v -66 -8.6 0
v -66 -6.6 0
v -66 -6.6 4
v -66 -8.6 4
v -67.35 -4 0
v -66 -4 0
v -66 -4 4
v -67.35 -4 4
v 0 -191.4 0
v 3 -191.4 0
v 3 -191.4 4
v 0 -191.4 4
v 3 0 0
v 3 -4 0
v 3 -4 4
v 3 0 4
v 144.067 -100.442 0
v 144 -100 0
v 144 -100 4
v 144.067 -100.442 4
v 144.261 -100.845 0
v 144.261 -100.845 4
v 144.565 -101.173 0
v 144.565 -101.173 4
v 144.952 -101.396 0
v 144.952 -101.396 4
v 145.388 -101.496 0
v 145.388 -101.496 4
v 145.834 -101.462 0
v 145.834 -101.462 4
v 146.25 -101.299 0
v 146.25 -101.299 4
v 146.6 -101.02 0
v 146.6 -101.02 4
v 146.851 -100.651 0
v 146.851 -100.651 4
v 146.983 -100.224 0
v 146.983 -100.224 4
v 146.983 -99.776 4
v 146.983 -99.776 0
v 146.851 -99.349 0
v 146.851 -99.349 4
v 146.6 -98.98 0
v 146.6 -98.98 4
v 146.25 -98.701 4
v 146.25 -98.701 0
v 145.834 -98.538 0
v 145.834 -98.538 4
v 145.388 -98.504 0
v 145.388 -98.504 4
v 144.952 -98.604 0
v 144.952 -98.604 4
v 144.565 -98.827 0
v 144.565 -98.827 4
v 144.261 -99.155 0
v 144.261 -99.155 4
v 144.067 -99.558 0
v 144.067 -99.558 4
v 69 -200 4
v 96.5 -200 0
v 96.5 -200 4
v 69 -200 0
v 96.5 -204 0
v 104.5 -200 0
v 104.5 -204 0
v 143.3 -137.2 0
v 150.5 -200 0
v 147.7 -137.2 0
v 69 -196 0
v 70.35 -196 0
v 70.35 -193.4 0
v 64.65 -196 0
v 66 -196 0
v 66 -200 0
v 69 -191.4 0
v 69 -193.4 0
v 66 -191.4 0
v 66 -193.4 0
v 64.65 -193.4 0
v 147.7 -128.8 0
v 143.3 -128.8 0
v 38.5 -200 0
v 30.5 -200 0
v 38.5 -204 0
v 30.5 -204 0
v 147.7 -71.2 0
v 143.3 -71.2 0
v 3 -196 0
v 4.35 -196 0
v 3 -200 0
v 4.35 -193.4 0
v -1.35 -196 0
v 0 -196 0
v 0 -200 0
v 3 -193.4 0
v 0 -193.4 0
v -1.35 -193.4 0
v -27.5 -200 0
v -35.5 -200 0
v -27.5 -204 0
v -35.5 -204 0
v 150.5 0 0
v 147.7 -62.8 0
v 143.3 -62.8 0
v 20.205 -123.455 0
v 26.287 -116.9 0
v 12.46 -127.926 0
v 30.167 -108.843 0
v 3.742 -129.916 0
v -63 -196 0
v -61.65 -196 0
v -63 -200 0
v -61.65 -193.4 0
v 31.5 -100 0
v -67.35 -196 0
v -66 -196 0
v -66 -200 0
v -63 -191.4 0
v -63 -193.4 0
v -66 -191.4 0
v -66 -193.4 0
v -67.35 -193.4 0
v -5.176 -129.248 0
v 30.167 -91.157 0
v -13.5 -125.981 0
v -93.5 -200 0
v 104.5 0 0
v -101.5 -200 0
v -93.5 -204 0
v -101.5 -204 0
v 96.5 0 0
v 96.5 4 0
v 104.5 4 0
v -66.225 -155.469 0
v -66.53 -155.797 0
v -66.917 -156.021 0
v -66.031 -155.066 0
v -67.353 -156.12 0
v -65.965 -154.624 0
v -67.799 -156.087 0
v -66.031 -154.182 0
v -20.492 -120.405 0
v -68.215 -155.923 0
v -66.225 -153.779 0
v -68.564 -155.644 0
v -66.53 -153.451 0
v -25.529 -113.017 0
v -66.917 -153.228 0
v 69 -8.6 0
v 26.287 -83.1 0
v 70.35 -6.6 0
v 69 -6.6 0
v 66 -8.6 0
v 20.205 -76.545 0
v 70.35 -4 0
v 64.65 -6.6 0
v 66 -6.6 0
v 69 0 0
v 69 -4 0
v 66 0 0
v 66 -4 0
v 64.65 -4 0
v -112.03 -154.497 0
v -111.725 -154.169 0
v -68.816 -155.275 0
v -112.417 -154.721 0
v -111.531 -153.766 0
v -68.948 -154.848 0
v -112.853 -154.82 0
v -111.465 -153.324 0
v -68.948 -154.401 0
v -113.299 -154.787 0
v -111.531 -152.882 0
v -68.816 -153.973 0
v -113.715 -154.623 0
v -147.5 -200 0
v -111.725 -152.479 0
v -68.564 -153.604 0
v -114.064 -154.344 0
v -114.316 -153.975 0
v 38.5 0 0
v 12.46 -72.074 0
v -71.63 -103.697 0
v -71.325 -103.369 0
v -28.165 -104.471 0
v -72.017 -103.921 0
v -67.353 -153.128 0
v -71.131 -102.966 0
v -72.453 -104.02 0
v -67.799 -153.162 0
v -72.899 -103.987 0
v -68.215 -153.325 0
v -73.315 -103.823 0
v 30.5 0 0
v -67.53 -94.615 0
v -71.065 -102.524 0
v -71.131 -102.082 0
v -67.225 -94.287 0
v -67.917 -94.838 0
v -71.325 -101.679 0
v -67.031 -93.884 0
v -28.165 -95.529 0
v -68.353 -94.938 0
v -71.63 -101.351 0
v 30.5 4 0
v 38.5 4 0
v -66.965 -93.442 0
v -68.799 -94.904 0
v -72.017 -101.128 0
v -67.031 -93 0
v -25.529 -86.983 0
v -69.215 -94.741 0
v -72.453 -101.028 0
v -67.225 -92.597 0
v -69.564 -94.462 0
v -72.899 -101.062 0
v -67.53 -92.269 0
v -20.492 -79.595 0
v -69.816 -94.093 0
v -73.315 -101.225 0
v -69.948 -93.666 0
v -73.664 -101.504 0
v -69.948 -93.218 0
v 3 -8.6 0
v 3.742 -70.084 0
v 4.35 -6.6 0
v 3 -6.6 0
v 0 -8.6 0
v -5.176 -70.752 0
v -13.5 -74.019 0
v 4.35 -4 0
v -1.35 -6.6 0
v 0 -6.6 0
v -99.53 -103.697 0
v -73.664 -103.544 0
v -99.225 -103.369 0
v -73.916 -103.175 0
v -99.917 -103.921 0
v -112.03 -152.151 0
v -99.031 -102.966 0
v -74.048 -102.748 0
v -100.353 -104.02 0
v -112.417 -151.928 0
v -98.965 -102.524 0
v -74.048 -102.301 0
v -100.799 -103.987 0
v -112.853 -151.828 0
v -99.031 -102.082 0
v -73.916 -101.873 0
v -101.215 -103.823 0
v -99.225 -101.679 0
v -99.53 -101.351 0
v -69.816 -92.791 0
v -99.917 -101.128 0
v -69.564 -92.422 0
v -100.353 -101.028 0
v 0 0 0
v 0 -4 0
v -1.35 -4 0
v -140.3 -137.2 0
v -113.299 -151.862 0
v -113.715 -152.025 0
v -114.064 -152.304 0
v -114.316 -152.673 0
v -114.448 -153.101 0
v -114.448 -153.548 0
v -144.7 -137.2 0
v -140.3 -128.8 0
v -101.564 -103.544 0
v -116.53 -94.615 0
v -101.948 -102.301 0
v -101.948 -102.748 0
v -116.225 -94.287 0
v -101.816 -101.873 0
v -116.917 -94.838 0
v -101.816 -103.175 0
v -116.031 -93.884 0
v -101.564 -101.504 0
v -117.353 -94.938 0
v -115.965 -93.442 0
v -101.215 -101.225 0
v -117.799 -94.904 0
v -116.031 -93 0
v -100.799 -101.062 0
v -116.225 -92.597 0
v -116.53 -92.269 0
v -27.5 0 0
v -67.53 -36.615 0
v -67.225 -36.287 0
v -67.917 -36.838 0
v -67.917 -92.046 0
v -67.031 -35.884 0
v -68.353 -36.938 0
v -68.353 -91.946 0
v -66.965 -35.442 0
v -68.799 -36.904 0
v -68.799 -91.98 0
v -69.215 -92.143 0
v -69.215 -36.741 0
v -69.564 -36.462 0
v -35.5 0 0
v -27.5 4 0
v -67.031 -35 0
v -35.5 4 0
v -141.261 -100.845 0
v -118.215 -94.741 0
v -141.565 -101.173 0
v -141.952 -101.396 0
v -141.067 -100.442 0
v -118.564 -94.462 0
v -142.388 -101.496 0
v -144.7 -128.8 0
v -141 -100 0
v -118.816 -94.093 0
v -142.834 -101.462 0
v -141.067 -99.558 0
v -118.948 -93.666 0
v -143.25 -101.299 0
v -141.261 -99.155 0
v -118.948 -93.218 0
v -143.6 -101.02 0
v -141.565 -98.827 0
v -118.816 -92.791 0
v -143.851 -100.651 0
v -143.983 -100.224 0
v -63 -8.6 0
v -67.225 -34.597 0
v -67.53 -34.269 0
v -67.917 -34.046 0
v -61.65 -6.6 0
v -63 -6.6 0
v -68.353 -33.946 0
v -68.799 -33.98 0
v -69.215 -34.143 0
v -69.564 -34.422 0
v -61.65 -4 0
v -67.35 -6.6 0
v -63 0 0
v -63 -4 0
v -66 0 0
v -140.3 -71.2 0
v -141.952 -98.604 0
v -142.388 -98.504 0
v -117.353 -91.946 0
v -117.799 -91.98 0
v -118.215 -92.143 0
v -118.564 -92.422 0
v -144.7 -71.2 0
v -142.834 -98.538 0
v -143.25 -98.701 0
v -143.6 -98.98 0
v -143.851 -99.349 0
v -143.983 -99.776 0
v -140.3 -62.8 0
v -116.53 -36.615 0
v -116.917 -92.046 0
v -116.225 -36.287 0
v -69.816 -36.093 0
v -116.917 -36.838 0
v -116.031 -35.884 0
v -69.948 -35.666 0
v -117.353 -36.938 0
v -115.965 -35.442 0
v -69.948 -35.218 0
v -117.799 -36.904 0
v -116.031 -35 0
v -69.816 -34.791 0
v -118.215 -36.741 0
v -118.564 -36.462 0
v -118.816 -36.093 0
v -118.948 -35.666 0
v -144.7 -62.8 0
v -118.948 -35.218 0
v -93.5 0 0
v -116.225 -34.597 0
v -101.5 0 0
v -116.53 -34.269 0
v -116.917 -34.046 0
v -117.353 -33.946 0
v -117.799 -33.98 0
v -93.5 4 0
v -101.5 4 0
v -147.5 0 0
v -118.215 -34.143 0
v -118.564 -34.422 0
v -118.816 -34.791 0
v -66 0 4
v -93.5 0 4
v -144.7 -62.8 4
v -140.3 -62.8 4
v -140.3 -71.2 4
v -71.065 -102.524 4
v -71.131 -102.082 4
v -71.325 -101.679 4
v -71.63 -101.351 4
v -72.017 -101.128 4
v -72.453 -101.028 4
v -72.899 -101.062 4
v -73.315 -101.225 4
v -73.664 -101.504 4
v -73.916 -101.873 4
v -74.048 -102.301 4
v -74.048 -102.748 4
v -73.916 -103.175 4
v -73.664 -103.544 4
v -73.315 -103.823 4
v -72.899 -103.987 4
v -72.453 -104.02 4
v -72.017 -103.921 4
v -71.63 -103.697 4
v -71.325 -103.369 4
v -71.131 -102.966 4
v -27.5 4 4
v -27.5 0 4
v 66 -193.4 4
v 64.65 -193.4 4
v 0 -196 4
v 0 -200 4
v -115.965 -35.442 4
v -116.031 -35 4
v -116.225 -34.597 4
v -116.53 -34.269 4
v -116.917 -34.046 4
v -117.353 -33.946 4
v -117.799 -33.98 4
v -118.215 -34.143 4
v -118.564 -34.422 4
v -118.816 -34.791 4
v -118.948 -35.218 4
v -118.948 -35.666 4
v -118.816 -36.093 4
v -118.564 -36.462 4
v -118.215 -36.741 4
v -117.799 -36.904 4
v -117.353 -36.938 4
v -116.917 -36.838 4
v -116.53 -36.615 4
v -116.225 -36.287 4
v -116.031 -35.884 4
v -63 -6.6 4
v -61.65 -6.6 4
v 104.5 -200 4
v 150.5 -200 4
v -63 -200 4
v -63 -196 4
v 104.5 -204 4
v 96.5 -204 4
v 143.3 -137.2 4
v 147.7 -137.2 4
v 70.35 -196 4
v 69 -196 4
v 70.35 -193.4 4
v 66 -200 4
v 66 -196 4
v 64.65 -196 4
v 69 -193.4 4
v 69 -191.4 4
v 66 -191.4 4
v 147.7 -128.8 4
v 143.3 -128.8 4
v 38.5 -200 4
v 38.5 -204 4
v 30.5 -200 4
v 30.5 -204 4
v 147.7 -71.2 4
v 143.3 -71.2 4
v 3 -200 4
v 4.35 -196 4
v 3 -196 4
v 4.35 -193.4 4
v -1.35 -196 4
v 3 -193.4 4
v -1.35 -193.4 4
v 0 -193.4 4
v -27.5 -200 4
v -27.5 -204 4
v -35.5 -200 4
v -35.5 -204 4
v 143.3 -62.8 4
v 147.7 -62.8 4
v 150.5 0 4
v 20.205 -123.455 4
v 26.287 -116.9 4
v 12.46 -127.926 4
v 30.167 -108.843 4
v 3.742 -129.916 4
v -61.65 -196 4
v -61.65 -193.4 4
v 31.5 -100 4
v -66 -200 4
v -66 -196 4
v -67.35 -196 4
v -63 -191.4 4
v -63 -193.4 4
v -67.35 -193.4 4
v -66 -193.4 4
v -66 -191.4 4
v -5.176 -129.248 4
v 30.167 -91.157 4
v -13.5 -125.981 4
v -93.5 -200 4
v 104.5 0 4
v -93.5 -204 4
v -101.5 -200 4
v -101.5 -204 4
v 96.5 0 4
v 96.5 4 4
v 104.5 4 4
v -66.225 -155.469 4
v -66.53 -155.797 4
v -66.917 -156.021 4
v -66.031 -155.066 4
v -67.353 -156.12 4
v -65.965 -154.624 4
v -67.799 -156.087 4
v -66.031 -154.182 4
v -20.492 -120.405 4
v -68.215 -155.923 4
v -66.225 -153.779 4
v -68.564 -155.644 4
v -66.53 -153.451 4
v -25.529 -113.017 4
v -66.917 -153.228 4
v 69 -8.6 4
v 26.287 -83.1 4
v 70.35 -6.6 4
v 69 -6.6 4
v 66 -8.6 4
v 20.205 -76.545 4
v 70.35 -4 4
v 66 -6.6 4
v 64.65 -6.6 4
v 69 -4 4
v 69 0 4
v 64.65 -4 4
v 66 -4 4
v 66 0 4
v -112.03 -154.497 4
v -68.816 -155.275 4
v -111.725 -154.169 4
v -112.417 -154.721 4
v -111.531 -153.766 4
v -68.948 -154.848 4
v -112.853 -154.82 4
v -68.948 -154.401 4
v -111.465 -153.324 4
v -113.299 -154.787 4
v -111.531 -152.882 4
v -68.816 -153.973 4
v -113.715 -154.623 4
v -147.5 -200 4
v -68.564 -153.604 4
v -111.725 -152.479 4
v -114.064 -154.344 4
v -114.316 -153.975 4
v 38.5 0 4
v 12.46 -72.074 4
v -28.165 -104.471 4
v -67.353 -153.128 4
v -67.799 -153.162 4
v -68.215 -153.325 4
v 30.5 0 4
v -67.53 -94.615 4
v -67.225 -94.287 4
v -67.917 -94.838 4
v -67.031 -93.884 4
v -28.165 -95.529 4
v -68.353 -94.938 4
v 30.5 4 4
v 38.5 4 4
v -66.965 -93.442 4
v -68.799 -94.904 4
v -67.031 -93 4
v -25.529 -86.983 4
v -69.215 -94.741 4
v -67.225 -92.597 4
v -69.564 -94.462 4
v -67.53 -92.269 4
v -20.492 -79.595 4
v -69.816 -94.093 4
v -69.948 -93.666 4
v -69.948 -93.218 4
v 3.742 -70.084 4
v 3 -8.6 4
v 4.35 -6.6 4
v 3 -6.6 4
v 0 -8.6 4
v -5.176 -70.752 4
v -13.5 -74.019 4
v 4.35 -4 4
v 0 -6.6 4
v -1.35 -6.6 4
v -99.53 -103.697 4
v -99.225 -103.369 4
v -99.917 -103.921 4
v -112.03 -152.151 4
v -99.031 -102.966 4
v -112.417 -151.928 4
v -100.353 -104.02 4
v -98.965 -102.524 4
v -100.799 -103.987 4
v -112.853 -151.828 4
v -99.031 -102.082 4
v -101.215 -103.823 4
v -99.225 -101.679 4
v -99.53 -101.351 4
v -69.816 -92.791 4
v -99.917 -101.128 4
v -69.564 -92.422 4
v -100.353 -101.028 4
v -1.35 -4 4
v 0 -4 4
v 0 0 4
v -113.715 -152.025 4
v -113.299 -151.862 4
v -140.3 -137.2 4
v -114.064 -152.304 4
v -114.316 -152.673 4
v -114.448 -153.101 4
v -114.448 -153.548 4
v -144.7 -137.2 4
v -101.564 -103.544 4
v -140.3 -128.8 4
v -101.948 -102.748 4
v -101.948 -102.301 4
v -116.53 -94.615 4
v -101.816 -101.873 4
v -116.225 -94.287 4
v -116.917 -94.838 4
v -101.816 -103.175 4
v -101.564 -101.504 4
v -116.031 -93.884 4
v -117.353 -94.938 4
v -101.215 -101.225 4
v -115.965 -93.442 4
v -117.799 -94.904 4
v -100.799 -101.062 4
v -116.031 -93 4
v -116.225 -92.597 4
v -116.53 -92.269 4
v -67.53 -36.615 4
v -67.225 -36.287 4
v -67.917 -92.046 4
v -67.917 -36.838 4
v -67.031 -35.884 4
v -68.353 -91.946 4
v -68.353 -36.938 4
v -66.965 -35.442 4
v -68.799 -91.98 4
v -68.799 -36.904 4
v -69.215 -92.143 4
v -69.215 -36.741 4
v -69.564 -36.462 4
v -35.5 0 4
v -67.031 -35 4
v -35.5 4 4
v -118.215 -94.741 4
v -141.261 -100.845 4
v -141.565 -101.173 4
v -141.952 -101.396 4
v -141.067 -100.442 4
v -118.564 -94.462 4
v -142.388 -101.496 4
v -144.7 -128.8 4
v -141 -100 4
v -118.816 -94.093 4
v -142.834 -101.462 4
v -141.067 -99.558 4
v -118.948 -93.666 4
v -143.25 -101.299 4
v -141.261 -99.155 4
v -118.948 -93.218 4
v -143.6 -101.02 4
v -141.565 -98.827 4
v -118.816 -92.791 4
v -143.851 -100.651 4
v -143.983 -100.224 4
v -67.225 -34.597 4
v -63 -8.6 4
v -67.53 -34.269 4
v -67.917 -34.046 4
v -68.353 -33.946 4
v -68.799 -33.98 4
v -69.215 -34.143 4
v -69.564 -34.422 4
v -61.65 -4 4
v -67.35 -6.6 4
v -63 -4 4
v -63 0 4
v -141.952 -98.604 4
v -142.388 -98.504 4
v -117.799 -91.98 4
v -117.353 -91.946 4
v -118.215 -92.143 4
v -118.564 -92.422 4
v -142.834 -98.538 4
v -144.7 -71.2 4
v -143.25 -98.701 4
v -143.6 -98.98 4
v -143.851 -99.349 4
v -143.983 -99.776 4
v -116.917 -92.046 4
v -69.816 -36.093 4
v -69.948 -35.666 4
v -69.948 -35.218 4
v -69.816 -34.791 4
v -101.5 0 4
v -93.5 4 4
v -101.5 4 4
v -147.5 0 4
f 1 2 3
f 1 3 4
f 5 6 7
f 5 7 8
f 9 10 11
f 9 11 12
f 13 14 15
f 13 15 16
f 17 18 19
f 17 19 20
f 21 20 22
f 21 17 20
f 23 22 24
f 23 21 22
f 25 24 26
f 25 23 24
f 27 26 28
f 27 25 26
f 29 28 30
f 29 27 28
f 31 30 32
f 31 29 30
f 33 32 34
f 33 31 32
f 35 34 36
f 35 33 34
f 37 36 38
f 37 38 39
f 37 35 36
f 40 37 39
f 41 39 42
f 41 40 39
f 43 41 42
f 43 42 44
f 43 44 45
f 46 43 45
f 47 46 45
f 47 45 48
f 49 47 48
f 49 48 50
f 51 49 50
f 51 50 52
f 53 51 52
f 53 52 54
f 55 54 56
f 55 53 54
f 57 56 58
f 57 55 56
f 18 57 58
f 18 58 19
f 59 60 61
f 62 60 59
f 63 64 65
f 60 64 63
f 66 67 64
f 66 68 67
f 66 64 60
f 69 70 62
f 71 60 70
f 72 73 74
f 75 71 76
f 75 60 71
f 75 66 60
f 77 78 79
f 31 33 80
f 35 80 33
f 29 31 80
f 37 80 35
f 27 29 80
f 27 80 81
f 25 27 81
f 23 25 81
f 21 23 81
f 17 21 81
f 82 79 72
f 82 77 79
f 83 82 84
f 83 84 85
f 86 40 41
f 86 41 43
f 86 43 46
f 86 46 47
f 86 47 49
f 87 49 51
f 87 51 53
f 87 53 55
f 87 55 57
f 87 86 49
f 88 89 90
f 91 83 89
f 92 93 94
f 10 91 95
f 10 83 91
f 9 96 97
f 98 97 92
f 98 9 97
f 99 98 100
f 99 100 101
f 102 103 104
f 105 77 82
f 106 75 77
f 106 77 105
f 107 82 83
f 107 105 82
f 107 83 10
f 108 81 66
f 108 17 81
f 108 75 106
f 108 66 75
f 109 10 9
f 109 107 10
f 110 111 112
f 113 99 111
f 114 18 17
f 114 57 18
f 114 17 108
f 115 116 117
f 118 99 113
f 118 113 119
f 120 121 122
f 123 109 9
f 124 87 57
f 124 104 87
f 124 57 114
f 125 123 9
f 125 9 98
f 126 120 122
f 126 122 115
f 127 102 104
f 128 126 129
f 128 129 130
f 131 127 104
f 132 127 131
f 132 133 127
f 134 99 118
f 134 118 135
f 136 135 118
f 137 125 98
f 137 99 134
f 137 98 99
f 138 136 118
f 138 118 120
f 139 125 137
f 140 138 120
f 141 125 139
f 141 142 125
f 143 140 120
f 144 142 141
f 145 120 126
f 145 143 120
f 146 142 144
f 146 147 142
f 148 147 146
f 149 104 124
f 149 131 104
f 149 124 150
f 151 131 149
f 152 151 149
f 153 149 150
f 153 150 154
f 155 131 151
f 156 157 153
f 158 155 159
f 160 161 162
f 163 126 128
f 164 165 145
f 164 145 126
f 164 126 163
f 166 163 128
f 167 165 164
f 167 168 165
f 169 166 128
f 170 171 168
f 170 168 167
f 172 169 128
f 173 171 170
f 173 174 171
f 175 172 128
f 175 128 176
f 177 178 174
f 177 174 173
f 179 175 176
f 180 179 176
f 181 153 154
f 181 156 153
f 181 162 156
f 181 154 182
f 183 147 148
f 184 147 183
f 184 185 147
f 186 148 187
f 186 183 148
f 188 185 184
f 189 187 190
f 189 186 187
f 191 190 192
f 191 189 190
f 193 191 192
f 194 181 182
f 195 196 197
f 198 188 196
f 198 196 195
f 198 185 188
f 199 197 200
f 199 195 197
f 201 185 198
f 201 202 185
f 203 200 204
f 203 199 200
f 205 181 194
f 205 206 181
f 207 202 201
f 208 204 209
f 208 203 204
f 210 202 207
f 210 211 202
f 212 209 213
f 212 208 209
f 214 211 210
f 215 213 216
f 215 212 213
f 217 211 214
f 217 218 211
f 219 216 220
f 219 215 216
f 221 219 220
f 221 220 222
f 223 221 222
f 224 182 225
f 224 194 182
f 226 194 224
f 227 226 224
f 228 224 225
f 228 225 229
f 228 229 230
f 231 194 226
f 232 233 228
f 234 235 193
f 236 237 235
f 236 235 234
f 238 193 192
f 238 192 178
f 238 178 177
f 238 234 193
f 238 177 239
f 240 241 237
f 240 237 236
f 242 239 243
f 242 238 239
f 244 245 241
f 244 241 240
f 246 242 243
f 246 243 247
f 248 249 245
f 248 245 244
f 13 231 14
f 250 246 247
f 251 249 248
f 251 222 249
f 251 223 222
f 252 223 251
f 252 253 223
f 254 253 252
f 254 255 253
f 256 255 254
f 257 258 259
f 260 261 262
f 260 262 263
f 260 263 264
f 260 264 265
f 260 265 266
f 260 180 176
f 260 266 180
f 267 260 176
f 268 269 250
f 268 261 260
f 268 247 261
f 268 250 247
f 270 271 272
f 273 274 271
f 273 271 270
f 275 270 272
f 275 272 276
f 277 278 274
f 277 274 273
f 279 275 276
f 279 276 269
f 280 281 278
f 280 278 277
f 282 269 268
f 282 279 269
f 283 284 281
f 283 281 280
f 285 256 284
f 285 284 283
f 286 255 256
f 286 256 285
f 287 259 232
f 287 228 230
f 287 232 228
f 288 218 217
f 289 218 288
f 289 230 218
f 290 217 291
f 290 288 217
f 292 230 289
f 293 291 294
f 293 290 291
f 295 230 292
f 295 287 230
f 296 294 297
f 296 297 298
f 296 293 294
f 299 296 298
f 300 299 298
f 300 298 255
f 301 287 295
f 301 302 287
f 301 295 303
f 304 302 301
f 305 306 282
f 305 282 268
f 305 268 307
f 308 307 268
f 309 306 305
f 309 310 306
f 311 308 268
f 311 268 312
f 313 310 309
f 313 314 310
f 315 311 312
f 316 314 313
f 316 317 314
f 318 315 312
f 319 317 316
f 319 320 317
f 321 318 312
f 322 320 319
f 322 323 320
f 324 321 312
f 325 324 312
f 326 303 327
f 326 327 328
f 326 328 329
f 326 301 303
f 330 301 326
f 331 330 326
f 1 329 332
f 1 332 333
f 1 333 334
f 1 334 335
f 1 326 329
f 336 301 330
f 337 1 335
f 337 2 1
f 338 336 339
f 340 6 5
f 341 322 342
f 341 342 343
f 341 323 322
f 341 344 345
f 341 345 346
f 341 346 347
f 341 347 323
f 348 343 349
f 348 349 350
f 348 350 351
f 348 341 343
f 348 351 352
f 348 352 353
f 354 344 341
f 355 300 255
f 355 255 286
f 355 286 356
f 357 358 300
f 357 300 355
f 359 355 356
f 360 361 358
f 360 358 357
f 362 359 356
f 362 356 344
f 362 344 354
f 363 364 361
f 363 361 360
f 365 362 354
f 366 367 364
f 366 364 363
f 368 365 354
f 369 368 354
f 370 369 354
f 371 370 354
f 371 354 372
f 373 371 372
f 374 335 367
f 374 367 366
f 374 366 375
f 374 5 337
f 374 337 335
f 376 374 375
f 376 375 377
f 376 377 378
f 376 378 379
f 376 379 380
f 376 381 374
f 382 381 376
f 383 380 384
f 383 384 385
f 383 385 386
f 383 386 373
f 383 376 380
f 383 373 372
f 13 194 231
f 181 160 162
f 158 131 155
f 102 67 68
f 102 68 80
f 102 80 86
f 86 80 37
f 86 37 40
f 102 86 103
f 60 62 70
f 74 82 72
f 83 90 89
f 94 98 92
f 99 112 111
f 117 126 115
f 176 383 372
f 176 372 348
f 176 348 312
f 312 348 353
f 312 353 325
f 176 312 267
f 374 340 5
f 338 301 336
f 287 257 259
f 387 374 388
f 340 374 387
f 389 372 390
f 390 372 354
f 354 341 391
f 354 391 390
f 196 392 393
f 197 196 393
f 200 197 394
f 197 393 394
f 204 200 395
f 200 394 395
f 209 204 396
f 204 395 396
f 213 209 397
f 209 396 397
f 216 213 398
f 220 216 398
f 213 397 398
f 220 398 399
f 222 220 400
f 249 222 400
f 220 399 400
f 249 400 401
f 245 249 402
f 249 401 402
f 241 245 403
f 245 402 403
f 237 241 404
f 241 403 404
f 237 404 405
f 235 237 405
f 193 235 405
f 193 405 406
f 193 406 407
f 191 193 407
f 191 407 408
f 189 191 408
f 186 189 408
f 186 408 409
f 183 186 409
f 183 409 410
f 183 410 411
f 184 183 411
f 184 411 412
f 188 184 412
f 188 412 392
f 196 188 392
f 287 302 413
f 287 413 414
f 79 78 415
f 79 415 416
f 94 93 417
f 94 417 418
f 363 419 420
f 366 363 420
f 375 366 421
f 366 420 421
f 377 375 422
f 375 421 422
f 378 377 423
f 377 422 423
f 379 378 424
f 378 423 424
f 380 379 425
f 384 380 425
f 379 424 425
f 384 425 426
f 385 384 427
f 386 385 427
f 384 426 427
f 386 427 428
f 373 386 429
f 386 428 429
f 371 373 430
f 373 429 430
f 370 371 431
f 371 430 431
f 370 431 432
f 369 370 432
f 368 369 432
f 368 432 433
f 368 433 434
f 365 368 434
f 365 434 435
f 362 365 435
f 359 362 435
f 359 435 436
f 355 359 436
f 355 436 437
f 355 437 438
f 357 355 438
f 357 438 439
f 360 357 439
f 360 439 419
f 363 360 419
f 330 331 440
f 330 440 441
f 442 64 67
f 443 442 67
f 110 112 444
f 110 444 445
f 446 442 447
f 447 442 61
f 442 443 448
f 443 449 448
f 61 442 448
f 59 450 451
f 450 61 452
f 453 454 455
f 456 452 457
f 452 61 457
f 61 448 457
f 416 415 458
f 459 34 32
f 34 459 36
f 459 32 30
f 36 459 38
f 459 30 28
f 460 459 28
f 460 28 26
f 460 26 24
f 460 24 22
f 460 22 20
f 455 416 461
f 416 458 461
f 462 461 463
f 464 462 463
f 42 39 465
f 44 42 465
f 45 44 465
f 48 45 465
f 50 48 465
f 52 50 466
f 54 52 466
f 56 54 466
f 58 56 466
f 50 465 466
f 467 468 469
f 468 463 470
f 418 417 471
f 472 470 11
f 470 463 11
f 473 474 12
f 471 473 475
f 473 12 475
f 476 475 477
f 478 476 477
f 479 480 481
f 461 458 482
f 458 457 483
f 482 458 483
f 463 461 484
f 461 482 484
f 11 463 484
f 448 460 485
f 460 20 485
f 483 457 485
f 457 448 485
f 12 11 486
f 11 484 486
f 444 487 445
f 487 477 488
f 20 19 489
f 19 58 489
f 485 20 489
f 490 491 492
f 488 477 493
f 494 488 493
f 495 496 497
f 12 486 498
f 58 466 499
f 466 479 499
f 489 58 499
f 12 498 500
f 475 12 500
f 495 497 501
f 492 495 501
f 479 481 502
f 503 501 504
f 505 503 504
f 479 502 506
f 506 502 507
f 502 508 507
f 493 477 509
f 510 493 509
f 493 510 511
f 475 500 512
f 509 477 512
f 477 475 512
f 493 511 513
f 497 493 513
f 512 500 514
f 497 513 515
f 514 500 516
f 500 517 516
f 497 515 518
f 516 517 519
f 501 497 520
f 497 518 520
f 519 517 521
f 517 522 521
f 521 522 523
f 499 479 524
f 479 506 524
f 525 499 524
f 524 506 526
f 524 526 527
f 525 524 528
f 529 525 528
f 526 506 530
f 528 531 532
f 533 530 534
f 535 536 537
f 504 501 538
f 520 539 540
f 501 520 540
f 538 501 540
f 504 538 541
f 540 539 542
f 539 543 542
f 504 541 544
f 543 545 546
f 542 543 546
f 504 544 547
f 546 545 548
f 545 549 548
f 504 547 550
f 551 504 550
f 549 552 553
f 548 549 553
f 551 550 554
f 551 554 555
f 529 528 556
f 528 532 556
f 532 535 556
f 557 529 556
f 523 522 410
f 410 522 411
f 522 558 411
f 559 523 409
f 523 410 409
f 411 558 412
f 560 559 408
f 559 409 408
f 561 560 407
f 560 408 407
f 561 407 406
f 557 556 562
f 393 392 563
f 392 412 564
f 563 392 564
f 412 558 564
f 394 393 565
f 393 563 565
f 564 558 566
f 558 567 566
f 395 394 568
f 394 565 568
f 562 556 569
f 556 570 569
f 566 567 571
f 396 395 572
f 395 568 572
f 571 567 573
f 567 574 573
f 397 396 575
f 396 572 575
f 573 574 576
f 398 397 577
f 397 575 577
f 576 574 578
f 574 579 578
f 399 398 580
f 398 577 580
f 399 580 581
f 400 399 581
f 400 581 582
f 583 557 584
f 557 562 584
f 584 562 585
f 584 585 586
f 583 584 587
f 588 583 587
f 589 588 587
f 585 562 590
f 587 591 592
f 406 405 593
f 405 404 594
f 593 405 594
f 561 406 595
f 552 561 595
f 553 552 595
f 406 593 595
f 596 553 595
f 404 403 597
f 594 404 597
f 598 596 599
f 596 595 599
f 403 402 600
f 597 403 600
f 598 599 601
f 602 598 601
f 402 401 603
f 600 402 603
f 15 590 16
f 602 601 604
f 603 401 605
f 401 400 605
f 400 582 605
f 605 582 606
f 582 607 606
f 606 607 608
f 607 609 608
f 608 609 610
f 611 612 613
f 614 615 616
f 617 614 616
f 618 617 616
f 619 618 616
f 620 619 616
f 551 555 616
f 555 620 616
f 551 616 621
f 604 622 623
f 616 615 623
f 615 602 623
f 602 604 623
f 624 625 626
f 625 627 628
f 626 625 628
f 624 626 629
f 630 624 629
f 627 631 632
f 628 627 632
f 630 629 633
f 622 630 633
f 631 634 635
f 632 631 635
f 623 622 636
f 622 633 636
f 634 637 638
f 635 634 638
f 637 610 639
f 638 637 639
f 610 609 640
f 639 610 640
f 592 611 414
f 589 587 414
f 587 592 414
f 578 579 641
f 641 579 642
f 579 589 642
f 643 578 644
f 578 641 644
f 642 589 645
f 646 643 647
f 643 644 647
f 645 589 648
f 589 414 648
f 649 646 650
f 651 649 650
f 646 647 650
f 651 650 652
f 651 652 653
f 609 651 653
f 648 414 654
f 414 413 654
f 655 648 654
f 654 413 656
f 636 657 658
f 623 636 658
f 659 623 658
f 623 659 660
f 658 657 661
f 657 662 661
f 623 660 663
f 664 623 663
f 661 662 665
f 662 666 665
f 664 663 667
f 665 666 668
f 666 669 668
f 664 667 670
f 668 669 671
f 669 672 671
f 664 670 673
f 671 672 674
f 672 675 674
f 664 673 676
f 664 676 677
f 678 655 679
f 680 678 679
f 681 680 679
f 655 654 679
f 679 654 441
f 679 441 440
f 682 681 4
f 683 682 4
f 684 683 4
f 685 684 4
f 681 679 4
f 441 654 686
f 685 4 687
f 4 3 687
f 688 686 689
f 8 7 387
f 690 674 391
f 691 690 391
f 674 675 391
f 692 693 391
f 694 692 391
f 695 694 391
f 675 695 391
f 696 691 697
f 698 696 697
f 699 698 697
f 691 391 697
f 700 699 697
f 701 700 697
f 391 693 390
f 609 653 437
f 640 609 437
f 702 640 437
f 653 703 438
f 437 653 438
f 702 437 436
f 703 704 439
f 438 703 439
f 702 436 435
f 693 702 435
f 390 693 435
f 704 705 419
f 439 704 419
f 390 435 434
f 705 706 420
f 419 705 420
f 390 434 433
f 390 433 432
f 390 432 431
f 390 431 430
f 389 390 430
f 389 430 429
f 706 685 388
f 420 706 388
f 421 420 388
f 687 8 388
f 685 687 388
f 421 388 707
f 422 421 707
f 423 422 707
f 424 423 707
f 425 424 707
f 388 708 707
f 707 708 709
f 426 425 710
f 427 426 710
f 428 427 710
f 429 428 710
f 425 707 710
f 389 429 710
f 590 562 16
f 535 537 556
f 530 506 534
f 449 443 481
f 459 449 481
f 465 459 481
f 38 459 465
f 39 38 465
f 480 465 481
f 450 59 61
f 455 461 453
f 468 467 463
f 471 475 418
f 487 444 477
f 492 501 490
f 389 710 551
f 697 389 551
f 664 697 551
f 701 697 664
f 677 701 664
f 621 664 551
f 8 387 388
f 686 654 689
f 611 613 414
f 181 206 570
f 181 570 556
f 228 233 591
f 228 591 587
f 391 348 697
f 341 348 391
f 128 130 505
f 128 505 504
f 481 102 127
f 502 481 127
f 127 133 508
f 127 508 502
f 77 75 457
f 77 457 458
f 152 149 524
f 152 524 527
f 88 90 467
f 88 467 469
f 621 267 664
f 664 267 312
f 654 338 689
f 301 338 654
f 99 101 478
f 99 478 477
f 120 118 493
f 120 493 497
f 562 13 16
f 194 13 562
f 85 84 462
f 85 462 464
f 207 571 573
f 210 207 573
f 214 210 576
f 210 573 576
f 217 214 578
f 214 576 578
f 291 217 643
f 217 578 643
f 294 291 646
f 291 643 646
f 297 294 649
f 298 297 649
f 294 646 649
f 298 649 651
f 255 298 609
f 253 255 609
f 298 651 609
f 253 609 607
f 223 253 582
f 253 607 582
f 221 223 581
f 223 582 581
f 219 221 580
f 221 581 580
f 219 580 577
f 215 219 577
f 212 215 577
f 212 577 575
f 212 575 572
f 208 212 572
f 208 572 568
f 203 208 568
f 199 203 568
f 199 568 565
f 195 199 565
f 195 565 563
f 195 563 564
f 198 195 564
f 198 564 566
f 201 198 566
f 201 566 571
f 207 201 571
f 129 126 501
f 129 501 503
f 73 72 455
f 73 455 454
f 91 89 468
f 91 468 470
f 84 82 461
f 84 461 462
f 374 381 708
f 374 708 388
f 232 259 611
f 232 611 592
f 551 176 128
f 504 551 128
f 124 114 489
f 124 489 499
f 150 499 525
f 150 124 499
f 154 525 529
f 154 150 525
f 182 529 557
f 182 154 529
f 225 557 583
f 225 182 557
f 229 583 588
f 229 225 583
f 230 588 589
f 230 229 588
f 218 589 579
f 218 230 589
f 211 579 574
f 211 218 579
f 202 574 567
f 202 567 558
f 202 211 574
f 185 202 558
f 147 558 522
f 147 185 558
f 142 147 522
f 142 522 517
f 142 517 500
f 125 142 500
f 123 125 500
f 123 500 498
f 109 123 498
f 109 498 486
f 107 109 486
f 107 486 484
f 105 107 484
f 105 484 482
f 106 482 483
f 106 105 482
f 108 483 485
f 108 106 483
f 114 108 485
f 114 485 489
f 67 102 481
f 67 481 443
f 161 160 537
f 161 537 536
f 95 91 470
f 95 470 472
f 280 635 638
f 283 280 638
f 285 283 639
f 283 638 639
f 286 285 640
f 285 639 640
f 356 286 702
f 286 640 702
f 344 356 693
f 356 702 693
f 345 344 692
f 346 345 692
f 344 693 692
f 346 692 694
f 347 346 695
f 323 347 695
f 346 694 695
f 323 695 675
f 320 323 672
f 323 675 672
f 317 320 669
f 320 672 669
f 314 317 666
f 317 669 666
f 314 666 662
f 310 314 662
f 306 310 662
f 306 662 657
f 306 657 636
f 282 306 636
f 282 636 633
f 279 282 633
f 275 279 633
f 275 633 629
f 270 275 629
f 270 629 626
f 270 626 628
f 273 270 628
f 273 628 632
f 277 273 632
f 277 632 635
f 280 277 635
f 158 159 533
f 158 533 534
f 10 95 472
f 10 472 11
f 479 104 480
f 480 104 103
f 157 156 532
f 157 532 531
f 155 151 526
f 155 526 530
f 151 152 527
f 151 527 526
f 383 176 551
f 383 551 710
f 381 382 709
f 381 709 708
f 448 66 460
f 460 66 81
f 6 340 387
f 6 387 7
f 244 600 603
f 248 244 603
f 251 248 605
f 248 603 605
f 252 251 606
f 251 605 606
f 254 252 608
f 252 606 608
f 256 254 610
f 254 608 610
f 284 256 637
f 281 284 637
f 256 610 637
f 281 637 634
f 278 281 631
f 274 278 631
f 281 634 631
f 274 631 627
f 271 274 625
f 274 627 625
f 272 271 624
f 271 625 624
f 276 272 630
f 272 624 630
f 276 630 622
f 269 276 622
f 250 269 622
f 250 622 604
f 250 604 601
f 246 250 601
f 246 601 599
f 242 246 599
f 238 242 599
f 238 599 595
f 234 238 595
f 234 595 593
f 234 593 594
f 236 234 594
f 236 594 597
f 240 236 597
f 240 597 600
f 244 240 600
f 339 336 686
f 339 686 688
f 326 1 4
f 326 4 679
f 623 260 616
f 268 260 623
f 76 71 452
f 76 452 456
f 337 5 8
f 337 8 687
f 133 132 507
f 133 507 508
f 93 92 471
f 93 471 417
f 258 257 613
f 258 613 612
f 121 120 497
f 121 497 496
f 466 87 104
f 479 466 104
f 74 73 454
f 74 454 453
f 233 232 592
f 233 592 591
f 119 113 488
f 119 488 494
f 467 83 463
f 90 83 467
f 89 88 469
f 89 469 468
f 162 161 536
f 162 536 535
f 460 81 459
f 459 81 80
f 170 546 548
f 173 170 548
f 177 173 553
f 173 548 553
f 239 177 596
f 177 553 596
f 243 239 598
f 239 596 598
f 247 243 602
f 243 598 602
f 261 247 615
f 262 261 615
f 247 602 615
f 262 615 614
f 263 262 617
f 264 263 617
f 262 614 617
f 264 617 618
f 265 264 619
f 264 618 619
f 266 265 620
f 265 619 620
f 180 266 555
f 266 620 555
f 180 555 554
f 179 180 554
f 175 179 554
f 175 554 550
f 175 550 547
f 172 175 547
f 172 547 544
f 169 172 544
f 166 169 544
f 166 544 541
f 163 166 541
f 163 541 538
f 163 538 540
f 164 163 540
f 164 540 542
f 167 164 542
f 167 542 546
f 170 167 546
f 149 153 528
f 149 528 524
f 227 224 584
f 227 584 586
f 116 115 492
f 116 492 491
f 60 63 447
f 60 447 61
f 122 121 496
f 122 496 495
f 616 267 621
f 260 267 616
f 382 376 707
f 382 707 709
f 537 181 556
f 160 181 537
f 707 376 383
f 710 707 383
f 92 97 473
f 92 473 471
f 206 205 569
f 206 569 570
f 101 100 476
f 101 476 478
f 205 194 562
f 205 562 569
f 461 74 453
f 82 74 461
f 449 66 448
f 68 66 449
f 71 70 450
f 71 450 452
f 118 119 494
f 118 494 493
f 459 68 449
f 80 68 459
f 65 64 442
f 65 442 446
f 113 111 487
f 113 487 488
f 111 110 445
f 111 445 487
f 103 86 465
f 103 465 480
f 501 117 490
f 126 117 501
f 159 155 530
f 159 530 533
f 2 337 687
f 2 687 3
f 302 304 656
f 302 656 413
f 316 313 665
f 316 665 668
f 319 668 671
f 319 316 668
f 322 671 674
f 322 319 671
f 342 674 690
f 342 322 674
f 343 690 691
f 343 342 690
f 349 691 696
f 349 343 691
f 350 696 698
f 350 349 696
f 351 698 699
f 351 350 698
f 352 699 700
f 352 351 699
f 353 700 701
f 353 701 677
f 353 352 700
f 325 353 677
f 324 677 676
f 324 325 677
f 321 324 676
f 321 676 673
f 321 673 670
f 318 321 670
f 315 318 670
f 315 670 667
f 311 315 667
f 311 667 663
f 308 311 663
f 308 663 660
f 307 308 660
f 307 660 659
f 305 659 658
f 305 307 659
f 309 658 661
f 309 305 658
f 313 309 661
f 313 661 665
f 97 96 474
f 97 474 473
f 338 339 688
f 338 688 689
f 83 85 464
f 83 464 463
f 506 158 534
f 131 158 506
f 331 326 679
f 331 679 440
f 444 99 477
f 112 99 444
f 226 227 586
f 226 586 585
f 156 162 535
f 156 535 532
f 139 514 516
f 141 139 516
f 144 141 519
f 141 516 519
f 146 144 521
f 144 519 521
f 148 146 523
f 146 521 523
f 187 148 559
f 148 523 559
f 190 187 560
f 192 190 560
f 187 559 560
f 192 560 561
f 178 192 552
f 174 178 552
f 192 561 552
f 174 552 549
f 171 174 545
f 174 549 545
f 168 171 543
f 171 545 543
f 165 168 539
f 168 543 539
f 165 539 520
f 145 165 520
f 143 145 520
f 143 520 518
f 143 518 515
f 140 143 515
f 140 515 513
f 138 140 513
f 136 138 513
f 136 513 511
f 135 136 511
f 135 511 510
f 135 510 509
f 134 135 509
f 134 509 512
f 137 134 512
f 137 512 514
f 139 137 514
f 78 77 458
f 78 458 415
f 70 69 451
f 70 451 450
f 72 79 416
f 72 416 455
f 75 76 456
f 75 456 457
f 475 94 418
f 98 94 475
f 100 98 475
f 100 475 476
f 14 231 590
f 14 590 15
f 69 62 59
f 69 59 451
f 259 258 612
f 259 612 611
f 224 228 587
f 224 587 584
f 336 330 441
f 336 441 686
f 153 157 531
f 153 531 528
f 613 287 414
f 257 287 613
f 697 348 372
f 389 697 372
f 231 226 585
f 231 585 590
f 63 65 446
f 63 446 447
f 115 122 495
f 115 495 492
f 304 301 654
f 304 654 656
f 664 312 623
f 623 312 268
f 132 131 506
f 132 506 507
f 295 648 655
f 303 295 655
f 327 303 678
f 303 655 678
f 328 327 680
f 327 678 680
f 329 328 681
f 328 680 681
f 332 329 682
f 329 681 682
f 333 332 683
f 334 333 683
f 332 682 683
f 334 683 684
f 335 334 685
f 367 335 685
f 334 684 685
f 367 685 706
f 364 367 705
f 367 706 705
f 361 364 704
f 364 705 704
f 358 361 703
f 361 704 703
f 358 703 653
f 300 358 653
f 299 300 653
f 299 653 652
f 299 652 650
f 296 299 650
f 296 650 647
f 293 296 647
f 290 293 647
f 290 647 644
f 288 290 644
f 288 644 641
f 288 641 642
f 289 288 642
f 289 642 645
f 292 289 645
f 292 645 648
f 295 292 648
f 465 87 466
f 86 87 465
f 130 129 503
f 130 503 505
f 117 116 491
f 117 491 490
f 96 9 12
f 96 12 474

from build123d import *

# Parameters (mm, degrees)
SKETCH_1_R          = 1.5
SKETCH_1_R_2        = 30
SKETCH_1_W          = 4.4
SKETCH_1_H          = 8.4
EXTRUDE_1_DEPTH     = 4
SKETCH_4_R          = 1.5
CUT_EXTRUDE_1_DEPTH = 10


with BuildPart() as part:
    # 草图1 → 凸台-拉伸1 (new body)
    with BuildSketch(Plane.XY):
        Polygon((0, 0), (0, -4), (-1.35, -4), (-1.35, -6.6), (0, -6.6), (0, -8.6), (3, -8.6), (3, -6.6), (4.35, -6.6), (4.35, -4), (3, -4), (3, 0), (30.5, 0), (30.5, 4), (38.5, 4), (38.5, 0), (66, 0), (66, -4), (64.65, -4), (64.65, -6.6), (66, -6.6), (66, -8.6), (69, -8.6), (69, -6.6), (70.35, -6.6), (70.35, -4), (69, -4), (69, 0), (96.5, 0), (96.5, 4), (104.5, 4), (104.5, 0), (132, 0), (143.5, 0), (145.5, 0), (150.5, 0), (150.5, -200), (145.5, -200), (143.5, -200), (132, -200), (104.5, -200), (104.5, -204), (96.5, -204), (96.5, -200), (69, -200), (69, -196), (70.35, -196), (70.35, -193.4), (69, -193.4), (69, -191.4), (66, -191.4), (66, -193.4), (64.65, -193.4), (64.65, -196), (66, -196), (66, -200), (38.5, -200), (38.5, -204), (30.5, -204), (30.5, -200), (3, -200), (3, -196), (4.35, -196), (4.35, -193.4), (3, -193.4), (3, -191.4), (0, -191.4), (0, -193.4), (-1.35, -193.4), (-1.35, -196), (0, -196), (0, -200), (-27.5, -200), (-27.5, -204), (-35.5, -204), (-35.5, -200), (-63, -200), (-63, -196), (-61.65, -196), (-61.65, -193.4), (-63, -193.4), (-63, -191.4), (-66, -191.4), (-66, -193.4), (-67.35, -193.4), (-67.35, -196), (-66, -196), (-66, -200), (-93.5, -200), (-93.5, -204), (-101.5, -204), (-101.5, -200), (-129, -200), (-140.5, -200), (-142.5, -200), (-147.5, -200), (-147.5, 0), (-142.5, 0), (-140.5, 0), (-129, 0), (-101.5, 0), (-101.5, 4), (-93.5, 4), (-93.5, 0), (-66, 0), (-66, -4), (-67.35, -4), (-67.35, -6.6), (-66, -6.6), (-66, -8.6), (-63, -8.6), (-63, -6.6), (-61.65, -6.6), (-61.65, -4), (-63, -4), (-63, 0), (-35.5, 0), (-35.5, 4), (-27.5, 4), (-27.5, 0), align=None)
        with Locations((-142.5, -100)):
            Circle(SKETCH_1_R, mode=Mode.SUBTRACT)
        with Locations(Location((145.5, -100, 0), (0, 0, 180))):
            Circle(SKETCH_1_R, mode=Mode.SUBTRACT)
        with Locations((1.5, -100)):
            Circle(SKETCH_1_R_2, mode=Mode.SUBTRACT)
        with Locations((-142.5, -67)):
            Rectangle(SKETCH_1_W, SKETCH_1_H, mode=Mode.SUBTRACT)
        with Locations((-142.5, -133)):
            Rectangle(SKETCH_1_W, SKETCH_1_H, mode=Mode.SUBTRACT)
        with Locations((145.5, -133)):
            Rectangle(SKETCH_1_W, SKETCH_1_H, mode=Mode.SUBTRACT)
        with Locations((145.5, -67)):
            Rectangle(SKETCH_1_W, SKETCH_1_H, mode=Mode.SUBTRACT)
    extrude(amount=EXTRUDE_1_DEPTH)

    # 草图4 → 切除-拉伸1 (cut)
    with BuildSketch(Plane.XY.offset(4)):
        with Locations((-100.464854909, -102.524202067)):
            Circle(SKETCH_4_R)
        with Locations((-72.564854909, -102.524202067)):
            Circle(SKETCH_4_R)
        with Locations((-112.964854909, -153.324202067)):
            Circle(SKETCH_4_R)
        with Locations((-67.464854909, -154.624202067)):
            Circle(SKETCH_4_R)
        with Locations((-117.464854909, -35.441983185)):
            Circle(SKETCH_4_R)
        with Locations((-68.464854909, -35.441983185)):
            Circle(SKETCH_4_R)
        with Locations((-117.464854909, -93.441983185)):
            Circle(SKETCH_4_R)
        with Locations((-68.464854909, -93.441983185)):
            Circle(SKETCH_4_R)
    extrude(amount=-CUT_EXTRUDE_1_DEPTH, mode=Mode.SUBTRACT)


solid = part.part
